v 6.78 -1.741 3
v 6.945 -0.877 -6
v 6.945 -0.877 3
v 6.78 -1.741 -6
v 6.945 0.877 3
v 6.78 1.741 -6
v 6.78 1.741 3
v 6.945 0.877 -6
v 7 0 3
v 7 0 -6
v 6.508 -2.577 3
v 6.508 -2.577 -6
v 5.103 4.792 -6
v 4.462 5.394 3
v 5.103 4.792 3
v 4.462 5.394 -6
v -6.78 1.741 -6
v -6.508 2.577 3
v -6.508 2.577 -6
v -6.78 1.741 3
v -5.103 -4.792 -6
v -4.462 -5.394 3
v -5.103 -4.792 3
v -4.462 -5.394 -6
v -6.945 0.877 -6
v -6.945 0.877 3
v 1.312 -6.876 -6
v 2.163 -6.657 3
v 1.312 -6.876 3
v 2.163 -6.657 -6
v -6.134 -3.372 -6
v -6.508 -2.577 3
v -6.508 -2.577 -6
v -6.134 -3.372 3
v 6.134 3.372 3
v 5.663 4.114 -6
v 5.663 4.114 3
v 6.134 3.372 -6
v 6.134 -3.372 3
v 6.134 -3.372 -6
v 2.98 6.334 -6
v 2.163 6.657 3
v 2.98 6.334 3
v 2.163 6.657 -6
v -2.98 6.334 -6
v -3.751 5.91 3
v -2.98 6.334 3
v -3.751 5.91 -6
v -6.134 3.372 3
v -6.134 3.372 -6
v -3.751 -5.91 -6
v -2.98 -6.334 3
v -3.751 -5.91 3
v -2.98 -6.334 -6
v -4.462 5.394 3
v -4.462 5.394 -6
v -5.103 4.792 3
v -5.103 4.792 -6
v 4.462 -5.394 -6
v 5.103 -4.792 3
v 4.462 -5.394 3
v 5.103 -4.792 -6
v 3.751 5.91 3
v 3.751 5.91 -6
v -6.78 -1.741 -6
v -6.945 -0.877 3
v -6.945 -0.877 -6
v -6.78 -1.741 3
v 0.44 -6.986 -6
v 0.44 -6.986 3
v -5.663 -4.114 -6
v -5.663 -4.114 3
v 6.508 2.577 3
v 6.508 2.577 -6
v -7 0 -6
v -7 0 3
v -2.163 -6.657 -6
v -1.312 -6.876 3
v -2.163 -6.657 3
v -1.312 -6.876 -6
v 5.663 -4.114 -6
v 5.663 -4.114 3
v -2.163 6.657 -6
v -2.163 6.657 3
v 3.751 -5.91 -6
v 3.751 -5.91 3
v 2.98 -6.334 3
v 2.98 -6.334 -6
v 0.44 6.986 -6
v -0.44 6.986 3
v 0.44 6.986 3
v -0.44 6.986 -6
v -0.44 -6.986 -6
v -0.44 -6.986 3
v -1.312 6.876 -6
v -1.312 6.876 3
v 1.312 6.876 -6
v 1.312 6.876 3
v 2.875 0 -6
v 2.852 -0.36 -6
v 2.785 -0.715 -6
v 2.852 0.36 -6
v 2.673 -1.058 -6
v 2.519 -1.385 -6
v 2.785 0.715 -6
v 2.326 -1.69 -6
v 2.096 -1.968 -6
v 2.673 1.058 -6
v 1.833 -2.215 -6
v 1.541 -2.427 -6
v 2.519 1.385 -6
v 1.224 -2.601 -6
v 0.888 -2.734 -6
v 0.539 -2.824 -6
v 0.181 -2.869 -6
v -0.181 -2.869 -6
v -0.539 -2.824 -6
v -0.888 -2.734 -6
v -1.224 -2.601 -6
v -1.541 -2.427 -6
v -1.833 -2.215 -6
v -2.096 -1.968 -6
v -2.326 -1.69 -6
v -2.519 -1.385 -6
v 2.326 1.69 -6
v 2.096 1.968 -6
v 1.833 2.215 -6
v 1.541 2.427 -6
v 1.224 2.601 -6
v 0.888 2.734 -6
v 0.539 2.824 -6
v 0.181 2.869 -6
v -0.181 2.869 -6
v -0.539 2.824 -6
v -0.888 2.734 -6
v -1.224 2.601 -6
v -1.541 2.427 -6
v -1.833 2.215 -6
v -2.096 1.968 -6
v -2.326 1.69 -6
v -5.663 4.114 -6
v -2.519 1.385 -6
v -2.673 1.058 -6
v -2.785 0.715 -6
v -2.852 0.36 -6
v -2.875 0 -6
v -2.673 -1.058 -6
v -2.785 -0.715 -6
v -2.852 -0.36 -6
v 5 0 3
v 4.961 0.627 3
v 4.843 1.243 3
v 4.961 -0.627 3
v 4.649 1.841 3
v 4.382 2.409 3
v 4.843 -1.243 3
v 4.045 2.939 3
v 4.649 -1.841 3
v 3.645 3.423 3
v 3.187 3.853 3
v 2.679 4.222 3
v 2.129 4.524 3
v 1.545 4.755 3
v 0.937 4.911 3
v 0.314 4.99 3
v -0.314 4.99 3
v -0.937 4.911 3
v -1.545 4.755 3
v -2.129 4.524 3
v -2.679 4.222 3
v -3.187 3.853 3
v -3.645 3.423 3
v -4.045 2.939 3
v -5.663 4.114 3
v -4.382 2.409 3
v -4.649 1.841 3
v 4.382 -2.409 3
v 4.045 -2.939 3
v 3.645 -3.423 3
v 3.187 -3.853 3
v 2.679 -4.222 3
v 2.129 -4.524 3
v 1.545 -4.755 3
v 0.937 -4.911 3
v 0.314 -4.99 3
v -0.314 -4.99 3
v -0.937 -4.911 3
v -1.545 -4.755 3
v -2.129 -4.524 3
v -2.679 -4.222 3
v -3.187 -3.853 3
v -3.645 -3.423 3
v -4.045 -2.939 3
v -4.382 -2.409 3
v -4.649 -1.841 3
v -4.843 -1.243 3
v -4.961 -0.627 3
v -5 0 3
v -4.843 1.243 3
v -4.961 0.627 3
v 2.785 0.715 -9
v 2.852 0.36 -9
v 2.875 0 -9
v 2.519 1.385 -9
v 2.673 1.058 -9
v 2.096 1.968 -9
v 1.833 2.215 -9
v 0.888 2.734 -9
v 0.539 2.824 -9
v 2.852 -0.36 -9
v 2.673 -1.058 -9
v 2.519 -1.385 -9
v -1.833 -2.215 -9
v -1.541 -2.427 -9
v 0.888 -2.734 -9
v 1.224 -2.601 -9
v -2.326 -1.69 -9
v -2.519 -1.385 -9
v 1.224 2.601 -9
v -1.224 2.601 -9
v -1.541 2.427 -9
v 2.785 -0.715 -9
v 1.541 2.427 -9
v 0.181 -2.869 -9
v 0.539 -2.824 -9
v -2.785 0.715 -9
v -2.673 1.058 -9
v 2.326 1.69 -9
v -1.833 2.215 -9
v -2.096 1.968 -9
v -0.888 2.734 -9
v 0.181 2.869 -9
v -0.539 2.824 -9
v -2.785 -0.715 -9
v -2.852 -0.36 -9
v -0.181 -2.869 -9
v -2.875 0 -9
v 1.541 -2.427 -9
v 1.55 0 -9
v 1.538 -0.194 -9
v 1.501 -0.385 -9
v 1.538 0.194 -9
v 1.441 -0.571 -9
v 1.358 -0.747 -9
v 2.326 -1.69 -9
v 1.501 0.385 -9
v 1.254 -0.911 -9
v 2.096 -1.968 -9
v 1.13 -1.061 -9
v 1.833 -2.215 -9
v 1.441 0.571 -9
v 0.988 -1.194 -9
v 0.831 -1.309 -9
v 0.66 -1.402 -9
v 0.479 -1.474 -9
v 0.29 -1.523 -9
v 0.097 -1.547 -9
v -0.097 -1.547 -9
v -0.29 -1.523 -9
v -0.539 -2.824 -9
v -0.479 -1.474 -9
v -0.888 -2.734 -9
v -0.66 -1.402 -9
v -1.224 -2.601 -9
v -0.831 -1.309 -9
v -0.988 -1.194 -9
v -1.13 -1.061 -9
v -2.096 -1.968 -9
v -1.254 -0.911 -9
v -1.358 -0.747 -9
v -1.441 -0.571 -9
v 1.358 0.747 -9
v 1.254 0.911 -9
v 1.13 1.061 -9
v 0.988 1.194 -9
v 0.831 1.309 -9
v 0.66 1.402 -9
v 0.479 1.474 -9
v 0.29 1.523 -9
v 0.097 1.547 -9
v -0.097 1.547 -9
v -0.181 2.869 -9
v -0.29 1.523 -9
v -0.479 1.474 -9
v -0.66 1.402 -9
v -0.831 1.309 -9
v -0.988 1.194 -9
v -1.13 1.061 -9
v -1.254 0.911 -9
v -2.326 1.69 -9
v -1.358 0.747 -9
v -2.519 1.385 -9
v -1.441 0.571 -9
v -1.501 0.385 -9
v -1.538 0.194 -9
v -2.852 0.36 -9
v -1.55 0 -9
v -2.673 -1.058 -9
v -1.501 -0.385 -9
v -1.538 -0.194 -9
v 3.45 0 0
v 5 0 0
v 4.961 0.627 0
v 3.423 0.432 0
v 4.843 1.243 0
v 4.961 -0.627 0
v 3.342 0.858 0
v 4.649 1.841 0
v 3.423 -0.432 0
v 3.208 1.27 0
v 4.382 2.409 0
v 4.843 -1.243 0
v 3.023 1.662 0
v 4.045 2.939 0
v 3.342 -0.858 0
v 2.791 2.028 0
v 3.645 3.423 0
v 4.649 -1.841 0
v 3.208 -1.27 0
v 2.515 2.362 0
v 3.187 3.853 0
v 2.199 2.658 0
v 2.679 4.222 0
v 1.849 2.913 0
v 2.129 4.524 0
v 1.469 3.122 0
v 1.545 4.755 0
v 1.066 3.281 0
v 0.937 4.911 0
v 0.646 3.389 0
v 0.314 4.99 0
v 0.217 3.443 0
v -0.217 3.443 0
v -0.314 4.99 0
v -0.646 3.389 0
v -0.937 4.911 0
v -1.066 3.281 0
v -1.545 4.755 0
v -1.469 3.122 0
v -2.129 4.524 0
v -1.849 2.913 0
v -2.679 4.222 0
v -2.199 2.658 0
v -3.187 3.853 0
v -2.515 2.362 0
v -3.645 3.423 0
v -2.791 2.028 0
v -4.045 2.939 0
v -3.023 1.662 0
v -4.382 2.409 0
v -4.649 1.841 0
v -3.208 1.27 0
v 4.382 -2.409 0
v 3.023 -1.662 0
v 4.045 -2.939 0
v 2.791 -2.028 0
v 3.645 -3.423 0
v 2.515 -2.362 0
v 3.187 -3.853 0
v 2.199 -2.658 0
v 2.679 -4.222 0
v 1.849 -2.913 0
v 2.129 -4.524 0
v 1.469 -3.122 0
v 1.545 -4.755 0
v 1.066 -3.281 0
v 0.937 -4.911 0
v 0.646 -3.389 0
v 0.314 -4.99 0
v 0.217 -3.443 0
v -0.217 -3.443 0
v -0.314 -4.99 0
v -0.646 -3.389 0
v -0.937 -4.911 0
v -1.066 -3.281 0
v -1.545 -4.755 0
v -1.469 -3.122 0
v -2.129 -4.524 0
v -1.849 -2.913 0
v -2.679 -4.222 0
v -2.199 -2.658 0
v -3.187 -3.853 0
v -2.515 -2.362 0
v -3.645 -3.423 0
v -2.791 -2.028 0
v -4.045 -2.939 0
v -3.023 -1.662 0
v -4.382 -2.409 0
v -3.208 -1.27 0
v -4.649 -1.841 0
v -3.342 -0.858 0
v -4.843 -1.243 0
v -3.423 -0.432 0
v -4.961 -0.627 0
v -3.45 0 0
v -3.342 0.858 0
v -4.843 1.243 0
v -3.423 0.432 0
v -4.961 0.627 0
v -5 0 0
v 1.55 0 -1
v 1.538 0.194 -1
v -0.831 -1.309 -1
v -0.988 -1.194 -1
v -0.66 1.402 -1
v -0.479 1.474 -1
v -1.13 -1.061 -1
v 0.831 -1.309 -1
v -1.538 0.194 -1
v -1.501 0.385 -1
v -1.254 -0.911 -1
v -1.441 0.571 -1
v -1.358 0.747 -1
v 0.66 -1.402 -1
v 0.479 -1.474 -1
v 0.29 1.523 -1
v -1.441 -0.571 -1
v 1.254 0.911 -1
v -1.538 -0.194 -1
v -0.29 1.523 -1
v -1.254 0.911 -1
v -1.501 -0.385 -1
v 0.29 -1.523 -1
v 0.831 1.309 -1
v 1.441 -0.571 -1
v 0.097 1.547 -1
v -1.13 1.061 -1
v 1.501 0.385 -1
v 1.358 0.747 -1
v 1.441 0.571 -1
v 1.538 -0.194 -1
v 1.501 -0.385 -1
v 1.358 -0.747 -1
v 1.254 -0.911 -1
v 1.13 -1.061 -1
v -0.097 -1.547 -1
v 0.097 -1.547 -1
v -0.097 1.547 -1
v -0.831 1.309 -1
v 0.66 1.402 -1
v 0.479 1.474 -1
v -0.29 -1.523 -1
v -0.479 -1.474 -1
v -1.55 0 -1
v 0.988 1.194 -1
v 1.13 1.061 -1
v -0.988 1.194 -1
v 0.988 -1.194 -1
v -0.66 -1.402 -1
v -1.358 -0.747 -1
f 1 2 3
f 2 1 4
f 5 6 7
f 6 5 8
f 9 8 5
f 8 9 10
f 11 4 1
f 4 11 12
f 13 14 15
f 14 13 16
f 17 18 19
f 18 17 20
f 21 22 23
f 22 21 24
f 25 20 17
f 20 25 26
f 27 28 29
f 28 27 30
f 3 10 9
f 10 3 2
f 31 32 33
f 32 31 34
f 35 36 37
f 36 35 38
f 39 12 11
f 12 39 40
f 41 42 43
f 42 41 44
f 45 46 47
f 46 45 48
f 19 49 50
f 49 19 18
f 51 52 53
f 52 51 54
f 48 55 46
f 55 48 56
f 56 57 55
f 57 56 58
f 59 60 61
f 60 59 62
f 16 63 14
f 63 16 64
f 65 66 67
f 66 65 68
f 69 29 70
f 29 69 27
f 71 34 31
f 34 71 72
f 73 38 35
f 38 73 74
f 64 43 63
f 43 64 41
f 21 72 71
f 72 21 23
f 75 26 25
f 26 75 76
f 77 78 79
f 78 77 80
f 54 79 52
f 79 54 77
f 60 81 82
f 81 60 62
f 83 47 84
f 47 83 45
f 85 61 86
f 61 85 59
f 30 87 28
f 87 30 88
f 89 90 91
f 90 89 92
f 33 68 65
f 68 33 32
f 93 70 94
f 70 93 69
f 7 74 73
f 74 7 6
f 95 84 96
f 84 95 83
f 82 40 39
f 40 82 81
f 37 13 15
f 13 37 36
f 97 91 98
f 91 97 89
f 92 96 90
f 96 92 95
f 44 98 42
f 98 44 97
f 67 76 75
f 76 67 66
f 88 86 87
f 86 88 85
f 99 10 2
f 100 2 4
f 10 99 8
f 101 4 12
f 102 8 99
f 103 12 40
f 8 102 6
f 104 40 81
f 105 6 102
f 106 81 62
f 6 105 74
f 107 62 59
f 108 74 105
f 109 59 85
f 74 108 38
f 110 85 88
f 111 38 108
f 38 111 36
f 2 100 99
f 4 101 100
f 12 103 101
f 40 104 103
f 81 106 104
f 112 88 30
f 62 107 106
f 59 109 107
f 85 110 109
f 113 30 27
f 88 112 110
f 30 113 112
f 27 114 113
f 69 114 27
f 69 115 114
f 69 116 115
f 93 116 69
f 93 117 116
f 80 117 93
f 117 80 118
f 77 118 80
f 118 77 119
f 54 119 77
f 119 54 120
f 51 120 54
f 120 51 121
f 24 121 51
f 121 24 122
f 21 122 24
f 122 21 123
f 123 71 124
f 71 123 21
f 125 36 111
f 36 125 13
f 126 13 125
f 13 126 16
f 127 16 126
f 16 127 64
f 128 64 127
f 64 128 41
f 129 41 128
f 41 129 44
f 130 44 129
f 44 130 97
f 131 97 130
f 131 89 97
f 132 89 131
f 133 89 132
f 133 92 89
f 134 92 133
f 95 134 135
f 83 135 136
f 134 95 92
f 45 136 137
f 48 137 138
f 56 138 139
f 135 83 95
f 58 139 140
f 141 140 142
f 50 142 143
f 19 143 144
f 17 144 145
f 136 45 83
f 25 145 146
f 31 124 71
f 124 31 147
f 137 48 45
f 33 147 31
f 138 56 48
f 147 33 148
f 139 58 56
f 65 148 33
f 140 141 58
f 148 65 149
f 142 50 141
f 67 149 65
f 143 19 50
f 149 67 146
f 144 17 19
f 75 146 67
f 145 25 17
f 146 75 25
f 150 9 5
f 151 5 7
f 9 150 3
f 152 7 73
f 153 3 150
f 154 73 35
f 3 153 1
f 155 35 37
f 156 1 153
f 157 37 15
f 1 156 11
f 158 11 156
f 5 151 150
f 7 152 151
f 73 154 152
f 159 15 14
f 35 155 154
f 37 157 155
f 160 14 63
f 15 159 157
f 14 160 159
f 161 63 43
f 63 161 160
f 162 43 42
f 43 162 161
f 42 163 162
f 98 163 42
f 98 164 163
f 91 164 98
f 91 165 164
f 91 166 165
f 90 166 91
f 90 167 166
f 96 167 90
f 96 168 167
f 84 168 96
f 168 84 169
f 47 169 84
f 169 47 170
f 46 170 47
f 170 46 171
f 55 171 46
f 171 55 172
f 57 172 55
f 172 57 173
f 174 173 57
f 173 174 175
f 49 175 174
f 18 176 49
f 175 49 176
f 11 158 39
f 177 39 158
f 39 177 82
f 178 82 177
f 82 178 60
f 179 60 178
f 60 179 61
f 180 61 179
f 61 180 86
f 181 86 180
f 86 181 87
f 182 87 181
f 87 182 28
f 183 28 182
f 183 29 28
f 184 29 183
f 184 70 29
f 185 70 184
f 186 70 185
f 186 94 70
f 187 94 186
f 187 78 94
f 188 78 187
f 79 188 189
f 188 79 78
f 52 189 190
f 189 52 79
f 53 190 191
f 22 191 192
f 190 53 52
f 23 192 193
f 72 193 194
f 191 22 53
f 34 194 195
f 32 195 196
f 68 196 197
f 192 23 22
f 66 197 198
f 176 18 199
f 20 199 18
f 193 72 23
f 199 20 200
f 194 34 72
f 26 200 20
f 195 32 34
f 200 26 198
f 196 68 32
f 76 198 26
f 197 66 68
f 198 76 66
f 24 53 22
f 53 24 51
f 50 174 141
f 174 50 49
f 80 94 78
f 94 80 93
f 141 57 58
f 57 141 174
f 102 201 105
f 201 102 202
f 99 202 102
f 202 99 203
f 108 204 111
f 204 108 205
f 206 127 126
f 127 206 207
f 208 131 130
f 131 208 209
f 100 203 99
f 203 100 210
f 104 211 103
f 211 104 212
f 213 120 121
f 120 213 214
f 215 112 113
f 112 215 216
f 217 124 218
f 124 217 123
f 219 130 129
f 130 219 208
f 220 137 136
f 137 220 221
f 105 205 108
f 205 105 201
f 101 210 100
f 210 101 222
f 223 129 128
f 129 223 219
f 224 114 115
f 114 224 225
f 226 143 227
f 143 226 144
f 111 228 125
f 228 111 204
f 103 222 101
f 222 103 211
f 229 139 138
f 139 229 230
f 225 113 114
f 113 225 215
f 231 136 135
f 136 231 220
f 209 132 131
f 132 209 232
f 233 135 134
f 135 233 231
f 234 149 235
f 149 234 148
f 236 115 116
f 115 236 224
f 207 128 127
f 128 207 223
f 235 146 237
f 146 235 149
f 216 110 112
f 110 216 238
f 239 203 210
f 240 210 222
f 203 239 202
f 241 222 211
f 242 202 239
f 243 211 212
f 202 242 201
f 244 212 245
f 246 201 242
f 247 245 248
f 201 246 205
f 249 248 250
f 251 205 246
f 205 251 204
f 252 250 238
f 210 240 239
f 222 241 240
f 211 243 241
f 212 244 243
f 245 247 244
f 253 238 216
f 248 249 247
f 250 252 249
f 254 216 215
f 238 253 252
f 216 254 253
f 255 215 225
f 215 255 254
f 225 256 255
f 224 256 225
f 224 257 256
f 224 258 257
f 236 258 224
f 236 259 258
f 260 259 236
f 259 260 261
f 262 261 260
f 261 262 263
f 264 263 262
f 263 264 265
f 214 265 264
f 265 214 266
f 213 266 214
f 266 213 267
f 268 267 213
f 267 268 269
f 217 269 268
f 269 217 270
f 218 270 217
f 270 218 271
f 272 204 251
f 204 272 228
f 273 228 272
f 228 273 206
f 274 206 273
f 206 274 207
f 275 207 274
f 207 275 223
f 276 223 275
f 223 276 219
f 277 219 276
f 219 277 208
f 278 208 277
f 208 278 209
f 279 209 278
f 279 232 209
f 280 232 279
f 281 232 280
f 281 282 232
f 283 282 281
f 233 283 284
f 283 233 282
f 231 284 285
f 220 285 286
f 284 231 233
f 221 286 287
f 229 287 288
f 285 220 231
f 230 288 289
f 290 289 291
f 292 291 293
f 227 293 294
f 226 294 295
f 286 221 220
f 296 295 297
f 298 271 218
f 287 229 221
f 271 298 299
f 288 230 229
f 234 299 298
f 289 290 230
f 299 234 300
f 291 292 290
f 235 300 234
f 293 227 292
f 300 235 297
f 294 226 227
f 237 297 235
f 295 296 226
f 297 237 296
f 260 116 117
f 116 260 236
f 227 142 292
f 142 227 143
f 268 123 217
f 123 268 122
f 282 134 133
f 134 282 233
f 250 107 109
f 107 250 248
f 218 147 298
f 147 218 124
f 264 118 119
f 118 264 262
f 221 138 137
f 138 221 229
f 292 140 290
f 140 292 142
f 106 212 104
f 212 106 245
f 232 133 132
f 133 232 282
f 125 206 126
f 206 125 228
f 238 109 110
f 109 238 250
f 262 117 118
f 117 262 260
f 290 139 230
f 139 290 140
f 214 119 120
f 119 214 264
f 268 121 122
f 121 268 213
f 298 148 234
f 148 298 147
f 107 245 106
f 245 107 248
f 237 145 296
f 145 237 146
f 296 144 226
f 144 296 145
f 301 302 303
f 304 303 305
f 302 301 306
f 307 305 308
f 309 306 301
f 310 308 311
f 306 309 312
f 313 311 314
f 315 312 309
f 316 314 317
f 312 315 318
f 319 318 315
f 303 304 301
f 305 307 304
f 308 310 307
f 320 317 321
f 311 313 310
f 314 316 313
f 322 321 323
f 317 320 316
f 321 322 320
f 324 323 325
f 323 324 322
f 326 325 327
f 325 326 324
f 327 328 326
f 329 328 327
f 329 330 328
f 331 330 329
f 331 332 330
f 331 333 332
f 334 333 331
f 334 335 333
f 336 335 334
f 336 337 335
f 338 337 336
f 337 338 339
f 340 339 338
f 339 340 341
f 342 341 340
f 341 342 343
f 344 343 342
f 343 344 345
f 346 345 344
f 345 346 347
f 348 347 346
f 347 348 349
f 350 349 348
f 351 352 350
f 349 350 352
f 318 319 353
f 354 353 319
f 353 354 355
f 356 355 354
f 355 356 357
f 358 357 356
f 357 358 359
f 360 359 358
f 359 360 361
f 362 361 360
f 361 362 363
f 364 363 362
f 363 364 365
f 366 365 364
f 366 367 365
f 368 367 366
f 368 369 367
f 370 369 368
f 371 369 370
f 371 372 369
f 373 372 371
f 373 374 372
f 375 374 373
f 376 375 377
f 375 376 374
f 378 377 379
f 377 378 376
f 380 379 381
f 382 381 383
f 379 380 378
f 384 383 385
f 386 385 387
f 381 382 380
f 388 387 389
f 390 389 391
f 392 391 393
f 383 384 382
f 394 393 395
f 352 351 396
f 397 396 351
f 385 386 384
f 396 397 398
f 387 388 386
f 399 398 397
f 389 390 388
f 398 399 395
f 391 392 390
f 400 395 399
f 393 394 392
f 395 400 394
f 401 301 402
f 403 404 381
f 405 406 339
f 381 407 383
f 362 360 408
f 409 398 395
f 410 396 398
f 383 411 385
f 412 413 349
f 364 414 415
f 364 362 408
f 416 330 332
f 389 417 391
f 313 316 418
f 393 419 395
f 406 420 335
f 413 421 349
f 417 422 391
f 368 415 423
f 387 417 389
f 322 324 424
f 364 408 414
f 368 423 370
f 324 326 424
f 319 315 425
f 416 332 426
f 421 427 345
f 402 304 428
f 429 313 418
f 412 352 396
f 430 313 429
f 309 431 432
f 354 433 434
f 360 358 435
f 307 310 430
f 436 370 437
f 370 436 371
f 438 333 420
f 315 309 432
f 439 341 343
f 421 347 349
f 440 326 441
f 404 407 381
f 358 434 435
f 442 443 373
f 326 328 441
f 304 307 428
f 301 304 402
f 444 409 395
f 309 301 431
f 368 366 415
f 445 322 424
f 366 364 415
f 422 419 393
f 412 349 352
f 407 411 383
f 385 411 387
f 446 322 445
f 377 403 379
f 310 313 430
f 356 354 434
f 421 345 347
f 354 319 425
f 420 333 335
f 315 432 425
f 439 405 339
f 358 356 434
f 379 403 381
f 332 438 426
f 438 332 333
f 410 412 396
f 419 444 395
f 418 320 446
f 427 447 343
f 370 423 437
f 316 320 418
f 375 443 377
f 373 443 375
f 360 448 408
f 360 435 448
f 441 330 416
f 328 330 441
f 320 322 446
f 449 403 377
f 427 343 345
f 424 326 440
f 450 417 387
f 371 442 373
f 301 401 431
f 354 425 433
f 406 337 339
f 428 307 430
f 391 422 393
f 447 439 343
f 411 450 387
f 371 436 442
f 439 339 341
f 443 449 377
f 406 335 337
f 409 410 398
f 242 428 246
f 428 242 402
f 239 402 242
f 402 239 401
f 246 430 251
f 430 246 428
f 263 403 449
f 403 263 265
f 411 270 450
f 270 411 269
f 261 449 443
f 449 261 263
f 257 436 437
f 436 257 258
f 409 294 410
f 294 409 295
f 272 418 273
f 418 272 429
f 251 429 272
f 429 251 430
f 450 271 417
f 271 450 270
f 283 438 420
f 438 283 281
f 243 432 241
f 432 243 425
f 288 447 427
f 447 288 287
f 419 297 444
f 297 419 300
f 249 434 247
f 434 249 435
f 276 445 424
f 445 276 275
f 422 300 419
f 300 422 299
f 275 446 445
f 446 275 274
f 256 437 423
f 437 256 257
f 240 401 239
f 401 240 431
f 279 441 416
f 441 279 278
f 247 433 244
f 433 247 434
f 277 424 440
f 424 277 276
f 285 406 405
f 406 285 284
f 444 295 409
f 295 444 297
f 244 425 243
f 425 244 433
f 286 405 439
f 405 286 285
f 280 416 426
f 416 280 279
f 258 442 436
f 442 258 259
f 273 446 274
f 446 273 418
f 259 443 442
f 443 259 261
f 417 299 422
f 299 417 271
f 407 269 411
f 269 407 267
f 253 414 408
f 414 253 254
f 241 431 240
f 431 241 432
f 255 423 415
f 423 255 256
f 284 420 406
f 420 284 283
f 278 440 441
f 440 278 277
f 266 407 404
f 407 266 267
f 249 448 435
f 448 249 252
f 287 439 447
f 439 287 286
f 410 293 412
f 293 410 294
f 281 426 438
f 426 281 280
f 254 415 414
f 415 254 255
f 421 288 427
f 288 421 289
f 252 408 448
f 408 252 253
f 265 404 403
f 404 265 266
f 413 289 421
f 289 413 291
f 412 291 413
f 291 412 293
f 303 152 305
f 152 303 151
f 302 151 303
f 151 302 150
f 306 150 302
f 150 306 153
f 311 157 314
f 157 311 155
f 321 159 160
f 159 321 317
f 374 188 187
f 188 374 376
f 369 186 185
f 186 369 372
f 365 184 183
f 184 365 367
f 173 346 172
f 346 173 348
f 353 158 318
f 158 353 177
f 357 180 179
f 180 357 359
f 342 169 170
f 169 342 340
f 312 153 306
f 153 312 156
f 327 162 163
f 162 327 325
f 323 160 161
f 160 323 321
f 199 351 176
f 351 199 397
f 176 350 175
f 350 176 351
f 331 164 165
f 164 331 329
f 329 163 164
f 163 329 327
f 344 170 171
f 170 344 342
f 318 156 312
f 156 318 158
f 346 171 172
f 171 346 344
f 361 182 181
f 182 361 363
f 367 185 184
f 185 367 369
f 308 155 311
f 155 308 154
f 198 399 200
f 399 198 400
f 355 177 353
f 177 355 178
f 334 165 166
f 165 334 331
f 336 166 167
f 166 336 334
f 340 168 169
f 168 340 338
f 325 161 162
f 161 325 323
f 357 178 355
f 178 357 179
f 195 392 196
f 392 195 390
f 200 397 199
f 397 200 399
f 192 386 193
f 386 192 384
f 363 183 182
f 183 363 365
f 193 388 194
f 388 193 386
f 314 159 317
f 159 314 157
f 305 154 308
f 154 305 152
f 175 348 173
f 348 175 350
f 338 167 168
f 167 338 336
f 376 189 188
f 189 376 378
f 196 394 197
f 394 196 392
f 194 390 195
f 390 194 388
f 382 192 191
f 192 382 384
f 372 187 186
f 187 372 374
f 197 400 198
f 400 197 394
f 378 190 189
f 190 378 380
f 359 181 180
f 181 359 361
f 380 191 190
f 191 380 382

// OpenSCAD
$fn = 50;

difference() {
	union() {
		translate(v = [0, 0, -6.0]) {
			cylinder(h = 9, r = 7.0);
		}
		#translate(v = [0, 0, -9.0]) {
			cylinder(h = 9, r = 2.875);
		}
	}
	union() {
		translate(v = [0, 0, 0]) {
			rotate(a = [0, 0, 0]) {
				difference() {
					union() {
						translate(v = [0, 0, -9.0]) {
							cylinder(h = 9, r = 1.25);
						}
						translate(v = [0, 0, -1.0]) {
							cylinder(h = 1.0, r1 = 1.55, r2 = 3.45);
						}
						translate(v = [0, 0, -9.0]) {
							cylinder(h = 9, r = 1.55);
						}
						translate(v = [0, 0, -9.0]) {
							cylinder(h = 9, r = 1.25);
						}
					}
					union();
				}
			}
		}
		#cylinder(h = 3, r = 5.0);
	}
}
